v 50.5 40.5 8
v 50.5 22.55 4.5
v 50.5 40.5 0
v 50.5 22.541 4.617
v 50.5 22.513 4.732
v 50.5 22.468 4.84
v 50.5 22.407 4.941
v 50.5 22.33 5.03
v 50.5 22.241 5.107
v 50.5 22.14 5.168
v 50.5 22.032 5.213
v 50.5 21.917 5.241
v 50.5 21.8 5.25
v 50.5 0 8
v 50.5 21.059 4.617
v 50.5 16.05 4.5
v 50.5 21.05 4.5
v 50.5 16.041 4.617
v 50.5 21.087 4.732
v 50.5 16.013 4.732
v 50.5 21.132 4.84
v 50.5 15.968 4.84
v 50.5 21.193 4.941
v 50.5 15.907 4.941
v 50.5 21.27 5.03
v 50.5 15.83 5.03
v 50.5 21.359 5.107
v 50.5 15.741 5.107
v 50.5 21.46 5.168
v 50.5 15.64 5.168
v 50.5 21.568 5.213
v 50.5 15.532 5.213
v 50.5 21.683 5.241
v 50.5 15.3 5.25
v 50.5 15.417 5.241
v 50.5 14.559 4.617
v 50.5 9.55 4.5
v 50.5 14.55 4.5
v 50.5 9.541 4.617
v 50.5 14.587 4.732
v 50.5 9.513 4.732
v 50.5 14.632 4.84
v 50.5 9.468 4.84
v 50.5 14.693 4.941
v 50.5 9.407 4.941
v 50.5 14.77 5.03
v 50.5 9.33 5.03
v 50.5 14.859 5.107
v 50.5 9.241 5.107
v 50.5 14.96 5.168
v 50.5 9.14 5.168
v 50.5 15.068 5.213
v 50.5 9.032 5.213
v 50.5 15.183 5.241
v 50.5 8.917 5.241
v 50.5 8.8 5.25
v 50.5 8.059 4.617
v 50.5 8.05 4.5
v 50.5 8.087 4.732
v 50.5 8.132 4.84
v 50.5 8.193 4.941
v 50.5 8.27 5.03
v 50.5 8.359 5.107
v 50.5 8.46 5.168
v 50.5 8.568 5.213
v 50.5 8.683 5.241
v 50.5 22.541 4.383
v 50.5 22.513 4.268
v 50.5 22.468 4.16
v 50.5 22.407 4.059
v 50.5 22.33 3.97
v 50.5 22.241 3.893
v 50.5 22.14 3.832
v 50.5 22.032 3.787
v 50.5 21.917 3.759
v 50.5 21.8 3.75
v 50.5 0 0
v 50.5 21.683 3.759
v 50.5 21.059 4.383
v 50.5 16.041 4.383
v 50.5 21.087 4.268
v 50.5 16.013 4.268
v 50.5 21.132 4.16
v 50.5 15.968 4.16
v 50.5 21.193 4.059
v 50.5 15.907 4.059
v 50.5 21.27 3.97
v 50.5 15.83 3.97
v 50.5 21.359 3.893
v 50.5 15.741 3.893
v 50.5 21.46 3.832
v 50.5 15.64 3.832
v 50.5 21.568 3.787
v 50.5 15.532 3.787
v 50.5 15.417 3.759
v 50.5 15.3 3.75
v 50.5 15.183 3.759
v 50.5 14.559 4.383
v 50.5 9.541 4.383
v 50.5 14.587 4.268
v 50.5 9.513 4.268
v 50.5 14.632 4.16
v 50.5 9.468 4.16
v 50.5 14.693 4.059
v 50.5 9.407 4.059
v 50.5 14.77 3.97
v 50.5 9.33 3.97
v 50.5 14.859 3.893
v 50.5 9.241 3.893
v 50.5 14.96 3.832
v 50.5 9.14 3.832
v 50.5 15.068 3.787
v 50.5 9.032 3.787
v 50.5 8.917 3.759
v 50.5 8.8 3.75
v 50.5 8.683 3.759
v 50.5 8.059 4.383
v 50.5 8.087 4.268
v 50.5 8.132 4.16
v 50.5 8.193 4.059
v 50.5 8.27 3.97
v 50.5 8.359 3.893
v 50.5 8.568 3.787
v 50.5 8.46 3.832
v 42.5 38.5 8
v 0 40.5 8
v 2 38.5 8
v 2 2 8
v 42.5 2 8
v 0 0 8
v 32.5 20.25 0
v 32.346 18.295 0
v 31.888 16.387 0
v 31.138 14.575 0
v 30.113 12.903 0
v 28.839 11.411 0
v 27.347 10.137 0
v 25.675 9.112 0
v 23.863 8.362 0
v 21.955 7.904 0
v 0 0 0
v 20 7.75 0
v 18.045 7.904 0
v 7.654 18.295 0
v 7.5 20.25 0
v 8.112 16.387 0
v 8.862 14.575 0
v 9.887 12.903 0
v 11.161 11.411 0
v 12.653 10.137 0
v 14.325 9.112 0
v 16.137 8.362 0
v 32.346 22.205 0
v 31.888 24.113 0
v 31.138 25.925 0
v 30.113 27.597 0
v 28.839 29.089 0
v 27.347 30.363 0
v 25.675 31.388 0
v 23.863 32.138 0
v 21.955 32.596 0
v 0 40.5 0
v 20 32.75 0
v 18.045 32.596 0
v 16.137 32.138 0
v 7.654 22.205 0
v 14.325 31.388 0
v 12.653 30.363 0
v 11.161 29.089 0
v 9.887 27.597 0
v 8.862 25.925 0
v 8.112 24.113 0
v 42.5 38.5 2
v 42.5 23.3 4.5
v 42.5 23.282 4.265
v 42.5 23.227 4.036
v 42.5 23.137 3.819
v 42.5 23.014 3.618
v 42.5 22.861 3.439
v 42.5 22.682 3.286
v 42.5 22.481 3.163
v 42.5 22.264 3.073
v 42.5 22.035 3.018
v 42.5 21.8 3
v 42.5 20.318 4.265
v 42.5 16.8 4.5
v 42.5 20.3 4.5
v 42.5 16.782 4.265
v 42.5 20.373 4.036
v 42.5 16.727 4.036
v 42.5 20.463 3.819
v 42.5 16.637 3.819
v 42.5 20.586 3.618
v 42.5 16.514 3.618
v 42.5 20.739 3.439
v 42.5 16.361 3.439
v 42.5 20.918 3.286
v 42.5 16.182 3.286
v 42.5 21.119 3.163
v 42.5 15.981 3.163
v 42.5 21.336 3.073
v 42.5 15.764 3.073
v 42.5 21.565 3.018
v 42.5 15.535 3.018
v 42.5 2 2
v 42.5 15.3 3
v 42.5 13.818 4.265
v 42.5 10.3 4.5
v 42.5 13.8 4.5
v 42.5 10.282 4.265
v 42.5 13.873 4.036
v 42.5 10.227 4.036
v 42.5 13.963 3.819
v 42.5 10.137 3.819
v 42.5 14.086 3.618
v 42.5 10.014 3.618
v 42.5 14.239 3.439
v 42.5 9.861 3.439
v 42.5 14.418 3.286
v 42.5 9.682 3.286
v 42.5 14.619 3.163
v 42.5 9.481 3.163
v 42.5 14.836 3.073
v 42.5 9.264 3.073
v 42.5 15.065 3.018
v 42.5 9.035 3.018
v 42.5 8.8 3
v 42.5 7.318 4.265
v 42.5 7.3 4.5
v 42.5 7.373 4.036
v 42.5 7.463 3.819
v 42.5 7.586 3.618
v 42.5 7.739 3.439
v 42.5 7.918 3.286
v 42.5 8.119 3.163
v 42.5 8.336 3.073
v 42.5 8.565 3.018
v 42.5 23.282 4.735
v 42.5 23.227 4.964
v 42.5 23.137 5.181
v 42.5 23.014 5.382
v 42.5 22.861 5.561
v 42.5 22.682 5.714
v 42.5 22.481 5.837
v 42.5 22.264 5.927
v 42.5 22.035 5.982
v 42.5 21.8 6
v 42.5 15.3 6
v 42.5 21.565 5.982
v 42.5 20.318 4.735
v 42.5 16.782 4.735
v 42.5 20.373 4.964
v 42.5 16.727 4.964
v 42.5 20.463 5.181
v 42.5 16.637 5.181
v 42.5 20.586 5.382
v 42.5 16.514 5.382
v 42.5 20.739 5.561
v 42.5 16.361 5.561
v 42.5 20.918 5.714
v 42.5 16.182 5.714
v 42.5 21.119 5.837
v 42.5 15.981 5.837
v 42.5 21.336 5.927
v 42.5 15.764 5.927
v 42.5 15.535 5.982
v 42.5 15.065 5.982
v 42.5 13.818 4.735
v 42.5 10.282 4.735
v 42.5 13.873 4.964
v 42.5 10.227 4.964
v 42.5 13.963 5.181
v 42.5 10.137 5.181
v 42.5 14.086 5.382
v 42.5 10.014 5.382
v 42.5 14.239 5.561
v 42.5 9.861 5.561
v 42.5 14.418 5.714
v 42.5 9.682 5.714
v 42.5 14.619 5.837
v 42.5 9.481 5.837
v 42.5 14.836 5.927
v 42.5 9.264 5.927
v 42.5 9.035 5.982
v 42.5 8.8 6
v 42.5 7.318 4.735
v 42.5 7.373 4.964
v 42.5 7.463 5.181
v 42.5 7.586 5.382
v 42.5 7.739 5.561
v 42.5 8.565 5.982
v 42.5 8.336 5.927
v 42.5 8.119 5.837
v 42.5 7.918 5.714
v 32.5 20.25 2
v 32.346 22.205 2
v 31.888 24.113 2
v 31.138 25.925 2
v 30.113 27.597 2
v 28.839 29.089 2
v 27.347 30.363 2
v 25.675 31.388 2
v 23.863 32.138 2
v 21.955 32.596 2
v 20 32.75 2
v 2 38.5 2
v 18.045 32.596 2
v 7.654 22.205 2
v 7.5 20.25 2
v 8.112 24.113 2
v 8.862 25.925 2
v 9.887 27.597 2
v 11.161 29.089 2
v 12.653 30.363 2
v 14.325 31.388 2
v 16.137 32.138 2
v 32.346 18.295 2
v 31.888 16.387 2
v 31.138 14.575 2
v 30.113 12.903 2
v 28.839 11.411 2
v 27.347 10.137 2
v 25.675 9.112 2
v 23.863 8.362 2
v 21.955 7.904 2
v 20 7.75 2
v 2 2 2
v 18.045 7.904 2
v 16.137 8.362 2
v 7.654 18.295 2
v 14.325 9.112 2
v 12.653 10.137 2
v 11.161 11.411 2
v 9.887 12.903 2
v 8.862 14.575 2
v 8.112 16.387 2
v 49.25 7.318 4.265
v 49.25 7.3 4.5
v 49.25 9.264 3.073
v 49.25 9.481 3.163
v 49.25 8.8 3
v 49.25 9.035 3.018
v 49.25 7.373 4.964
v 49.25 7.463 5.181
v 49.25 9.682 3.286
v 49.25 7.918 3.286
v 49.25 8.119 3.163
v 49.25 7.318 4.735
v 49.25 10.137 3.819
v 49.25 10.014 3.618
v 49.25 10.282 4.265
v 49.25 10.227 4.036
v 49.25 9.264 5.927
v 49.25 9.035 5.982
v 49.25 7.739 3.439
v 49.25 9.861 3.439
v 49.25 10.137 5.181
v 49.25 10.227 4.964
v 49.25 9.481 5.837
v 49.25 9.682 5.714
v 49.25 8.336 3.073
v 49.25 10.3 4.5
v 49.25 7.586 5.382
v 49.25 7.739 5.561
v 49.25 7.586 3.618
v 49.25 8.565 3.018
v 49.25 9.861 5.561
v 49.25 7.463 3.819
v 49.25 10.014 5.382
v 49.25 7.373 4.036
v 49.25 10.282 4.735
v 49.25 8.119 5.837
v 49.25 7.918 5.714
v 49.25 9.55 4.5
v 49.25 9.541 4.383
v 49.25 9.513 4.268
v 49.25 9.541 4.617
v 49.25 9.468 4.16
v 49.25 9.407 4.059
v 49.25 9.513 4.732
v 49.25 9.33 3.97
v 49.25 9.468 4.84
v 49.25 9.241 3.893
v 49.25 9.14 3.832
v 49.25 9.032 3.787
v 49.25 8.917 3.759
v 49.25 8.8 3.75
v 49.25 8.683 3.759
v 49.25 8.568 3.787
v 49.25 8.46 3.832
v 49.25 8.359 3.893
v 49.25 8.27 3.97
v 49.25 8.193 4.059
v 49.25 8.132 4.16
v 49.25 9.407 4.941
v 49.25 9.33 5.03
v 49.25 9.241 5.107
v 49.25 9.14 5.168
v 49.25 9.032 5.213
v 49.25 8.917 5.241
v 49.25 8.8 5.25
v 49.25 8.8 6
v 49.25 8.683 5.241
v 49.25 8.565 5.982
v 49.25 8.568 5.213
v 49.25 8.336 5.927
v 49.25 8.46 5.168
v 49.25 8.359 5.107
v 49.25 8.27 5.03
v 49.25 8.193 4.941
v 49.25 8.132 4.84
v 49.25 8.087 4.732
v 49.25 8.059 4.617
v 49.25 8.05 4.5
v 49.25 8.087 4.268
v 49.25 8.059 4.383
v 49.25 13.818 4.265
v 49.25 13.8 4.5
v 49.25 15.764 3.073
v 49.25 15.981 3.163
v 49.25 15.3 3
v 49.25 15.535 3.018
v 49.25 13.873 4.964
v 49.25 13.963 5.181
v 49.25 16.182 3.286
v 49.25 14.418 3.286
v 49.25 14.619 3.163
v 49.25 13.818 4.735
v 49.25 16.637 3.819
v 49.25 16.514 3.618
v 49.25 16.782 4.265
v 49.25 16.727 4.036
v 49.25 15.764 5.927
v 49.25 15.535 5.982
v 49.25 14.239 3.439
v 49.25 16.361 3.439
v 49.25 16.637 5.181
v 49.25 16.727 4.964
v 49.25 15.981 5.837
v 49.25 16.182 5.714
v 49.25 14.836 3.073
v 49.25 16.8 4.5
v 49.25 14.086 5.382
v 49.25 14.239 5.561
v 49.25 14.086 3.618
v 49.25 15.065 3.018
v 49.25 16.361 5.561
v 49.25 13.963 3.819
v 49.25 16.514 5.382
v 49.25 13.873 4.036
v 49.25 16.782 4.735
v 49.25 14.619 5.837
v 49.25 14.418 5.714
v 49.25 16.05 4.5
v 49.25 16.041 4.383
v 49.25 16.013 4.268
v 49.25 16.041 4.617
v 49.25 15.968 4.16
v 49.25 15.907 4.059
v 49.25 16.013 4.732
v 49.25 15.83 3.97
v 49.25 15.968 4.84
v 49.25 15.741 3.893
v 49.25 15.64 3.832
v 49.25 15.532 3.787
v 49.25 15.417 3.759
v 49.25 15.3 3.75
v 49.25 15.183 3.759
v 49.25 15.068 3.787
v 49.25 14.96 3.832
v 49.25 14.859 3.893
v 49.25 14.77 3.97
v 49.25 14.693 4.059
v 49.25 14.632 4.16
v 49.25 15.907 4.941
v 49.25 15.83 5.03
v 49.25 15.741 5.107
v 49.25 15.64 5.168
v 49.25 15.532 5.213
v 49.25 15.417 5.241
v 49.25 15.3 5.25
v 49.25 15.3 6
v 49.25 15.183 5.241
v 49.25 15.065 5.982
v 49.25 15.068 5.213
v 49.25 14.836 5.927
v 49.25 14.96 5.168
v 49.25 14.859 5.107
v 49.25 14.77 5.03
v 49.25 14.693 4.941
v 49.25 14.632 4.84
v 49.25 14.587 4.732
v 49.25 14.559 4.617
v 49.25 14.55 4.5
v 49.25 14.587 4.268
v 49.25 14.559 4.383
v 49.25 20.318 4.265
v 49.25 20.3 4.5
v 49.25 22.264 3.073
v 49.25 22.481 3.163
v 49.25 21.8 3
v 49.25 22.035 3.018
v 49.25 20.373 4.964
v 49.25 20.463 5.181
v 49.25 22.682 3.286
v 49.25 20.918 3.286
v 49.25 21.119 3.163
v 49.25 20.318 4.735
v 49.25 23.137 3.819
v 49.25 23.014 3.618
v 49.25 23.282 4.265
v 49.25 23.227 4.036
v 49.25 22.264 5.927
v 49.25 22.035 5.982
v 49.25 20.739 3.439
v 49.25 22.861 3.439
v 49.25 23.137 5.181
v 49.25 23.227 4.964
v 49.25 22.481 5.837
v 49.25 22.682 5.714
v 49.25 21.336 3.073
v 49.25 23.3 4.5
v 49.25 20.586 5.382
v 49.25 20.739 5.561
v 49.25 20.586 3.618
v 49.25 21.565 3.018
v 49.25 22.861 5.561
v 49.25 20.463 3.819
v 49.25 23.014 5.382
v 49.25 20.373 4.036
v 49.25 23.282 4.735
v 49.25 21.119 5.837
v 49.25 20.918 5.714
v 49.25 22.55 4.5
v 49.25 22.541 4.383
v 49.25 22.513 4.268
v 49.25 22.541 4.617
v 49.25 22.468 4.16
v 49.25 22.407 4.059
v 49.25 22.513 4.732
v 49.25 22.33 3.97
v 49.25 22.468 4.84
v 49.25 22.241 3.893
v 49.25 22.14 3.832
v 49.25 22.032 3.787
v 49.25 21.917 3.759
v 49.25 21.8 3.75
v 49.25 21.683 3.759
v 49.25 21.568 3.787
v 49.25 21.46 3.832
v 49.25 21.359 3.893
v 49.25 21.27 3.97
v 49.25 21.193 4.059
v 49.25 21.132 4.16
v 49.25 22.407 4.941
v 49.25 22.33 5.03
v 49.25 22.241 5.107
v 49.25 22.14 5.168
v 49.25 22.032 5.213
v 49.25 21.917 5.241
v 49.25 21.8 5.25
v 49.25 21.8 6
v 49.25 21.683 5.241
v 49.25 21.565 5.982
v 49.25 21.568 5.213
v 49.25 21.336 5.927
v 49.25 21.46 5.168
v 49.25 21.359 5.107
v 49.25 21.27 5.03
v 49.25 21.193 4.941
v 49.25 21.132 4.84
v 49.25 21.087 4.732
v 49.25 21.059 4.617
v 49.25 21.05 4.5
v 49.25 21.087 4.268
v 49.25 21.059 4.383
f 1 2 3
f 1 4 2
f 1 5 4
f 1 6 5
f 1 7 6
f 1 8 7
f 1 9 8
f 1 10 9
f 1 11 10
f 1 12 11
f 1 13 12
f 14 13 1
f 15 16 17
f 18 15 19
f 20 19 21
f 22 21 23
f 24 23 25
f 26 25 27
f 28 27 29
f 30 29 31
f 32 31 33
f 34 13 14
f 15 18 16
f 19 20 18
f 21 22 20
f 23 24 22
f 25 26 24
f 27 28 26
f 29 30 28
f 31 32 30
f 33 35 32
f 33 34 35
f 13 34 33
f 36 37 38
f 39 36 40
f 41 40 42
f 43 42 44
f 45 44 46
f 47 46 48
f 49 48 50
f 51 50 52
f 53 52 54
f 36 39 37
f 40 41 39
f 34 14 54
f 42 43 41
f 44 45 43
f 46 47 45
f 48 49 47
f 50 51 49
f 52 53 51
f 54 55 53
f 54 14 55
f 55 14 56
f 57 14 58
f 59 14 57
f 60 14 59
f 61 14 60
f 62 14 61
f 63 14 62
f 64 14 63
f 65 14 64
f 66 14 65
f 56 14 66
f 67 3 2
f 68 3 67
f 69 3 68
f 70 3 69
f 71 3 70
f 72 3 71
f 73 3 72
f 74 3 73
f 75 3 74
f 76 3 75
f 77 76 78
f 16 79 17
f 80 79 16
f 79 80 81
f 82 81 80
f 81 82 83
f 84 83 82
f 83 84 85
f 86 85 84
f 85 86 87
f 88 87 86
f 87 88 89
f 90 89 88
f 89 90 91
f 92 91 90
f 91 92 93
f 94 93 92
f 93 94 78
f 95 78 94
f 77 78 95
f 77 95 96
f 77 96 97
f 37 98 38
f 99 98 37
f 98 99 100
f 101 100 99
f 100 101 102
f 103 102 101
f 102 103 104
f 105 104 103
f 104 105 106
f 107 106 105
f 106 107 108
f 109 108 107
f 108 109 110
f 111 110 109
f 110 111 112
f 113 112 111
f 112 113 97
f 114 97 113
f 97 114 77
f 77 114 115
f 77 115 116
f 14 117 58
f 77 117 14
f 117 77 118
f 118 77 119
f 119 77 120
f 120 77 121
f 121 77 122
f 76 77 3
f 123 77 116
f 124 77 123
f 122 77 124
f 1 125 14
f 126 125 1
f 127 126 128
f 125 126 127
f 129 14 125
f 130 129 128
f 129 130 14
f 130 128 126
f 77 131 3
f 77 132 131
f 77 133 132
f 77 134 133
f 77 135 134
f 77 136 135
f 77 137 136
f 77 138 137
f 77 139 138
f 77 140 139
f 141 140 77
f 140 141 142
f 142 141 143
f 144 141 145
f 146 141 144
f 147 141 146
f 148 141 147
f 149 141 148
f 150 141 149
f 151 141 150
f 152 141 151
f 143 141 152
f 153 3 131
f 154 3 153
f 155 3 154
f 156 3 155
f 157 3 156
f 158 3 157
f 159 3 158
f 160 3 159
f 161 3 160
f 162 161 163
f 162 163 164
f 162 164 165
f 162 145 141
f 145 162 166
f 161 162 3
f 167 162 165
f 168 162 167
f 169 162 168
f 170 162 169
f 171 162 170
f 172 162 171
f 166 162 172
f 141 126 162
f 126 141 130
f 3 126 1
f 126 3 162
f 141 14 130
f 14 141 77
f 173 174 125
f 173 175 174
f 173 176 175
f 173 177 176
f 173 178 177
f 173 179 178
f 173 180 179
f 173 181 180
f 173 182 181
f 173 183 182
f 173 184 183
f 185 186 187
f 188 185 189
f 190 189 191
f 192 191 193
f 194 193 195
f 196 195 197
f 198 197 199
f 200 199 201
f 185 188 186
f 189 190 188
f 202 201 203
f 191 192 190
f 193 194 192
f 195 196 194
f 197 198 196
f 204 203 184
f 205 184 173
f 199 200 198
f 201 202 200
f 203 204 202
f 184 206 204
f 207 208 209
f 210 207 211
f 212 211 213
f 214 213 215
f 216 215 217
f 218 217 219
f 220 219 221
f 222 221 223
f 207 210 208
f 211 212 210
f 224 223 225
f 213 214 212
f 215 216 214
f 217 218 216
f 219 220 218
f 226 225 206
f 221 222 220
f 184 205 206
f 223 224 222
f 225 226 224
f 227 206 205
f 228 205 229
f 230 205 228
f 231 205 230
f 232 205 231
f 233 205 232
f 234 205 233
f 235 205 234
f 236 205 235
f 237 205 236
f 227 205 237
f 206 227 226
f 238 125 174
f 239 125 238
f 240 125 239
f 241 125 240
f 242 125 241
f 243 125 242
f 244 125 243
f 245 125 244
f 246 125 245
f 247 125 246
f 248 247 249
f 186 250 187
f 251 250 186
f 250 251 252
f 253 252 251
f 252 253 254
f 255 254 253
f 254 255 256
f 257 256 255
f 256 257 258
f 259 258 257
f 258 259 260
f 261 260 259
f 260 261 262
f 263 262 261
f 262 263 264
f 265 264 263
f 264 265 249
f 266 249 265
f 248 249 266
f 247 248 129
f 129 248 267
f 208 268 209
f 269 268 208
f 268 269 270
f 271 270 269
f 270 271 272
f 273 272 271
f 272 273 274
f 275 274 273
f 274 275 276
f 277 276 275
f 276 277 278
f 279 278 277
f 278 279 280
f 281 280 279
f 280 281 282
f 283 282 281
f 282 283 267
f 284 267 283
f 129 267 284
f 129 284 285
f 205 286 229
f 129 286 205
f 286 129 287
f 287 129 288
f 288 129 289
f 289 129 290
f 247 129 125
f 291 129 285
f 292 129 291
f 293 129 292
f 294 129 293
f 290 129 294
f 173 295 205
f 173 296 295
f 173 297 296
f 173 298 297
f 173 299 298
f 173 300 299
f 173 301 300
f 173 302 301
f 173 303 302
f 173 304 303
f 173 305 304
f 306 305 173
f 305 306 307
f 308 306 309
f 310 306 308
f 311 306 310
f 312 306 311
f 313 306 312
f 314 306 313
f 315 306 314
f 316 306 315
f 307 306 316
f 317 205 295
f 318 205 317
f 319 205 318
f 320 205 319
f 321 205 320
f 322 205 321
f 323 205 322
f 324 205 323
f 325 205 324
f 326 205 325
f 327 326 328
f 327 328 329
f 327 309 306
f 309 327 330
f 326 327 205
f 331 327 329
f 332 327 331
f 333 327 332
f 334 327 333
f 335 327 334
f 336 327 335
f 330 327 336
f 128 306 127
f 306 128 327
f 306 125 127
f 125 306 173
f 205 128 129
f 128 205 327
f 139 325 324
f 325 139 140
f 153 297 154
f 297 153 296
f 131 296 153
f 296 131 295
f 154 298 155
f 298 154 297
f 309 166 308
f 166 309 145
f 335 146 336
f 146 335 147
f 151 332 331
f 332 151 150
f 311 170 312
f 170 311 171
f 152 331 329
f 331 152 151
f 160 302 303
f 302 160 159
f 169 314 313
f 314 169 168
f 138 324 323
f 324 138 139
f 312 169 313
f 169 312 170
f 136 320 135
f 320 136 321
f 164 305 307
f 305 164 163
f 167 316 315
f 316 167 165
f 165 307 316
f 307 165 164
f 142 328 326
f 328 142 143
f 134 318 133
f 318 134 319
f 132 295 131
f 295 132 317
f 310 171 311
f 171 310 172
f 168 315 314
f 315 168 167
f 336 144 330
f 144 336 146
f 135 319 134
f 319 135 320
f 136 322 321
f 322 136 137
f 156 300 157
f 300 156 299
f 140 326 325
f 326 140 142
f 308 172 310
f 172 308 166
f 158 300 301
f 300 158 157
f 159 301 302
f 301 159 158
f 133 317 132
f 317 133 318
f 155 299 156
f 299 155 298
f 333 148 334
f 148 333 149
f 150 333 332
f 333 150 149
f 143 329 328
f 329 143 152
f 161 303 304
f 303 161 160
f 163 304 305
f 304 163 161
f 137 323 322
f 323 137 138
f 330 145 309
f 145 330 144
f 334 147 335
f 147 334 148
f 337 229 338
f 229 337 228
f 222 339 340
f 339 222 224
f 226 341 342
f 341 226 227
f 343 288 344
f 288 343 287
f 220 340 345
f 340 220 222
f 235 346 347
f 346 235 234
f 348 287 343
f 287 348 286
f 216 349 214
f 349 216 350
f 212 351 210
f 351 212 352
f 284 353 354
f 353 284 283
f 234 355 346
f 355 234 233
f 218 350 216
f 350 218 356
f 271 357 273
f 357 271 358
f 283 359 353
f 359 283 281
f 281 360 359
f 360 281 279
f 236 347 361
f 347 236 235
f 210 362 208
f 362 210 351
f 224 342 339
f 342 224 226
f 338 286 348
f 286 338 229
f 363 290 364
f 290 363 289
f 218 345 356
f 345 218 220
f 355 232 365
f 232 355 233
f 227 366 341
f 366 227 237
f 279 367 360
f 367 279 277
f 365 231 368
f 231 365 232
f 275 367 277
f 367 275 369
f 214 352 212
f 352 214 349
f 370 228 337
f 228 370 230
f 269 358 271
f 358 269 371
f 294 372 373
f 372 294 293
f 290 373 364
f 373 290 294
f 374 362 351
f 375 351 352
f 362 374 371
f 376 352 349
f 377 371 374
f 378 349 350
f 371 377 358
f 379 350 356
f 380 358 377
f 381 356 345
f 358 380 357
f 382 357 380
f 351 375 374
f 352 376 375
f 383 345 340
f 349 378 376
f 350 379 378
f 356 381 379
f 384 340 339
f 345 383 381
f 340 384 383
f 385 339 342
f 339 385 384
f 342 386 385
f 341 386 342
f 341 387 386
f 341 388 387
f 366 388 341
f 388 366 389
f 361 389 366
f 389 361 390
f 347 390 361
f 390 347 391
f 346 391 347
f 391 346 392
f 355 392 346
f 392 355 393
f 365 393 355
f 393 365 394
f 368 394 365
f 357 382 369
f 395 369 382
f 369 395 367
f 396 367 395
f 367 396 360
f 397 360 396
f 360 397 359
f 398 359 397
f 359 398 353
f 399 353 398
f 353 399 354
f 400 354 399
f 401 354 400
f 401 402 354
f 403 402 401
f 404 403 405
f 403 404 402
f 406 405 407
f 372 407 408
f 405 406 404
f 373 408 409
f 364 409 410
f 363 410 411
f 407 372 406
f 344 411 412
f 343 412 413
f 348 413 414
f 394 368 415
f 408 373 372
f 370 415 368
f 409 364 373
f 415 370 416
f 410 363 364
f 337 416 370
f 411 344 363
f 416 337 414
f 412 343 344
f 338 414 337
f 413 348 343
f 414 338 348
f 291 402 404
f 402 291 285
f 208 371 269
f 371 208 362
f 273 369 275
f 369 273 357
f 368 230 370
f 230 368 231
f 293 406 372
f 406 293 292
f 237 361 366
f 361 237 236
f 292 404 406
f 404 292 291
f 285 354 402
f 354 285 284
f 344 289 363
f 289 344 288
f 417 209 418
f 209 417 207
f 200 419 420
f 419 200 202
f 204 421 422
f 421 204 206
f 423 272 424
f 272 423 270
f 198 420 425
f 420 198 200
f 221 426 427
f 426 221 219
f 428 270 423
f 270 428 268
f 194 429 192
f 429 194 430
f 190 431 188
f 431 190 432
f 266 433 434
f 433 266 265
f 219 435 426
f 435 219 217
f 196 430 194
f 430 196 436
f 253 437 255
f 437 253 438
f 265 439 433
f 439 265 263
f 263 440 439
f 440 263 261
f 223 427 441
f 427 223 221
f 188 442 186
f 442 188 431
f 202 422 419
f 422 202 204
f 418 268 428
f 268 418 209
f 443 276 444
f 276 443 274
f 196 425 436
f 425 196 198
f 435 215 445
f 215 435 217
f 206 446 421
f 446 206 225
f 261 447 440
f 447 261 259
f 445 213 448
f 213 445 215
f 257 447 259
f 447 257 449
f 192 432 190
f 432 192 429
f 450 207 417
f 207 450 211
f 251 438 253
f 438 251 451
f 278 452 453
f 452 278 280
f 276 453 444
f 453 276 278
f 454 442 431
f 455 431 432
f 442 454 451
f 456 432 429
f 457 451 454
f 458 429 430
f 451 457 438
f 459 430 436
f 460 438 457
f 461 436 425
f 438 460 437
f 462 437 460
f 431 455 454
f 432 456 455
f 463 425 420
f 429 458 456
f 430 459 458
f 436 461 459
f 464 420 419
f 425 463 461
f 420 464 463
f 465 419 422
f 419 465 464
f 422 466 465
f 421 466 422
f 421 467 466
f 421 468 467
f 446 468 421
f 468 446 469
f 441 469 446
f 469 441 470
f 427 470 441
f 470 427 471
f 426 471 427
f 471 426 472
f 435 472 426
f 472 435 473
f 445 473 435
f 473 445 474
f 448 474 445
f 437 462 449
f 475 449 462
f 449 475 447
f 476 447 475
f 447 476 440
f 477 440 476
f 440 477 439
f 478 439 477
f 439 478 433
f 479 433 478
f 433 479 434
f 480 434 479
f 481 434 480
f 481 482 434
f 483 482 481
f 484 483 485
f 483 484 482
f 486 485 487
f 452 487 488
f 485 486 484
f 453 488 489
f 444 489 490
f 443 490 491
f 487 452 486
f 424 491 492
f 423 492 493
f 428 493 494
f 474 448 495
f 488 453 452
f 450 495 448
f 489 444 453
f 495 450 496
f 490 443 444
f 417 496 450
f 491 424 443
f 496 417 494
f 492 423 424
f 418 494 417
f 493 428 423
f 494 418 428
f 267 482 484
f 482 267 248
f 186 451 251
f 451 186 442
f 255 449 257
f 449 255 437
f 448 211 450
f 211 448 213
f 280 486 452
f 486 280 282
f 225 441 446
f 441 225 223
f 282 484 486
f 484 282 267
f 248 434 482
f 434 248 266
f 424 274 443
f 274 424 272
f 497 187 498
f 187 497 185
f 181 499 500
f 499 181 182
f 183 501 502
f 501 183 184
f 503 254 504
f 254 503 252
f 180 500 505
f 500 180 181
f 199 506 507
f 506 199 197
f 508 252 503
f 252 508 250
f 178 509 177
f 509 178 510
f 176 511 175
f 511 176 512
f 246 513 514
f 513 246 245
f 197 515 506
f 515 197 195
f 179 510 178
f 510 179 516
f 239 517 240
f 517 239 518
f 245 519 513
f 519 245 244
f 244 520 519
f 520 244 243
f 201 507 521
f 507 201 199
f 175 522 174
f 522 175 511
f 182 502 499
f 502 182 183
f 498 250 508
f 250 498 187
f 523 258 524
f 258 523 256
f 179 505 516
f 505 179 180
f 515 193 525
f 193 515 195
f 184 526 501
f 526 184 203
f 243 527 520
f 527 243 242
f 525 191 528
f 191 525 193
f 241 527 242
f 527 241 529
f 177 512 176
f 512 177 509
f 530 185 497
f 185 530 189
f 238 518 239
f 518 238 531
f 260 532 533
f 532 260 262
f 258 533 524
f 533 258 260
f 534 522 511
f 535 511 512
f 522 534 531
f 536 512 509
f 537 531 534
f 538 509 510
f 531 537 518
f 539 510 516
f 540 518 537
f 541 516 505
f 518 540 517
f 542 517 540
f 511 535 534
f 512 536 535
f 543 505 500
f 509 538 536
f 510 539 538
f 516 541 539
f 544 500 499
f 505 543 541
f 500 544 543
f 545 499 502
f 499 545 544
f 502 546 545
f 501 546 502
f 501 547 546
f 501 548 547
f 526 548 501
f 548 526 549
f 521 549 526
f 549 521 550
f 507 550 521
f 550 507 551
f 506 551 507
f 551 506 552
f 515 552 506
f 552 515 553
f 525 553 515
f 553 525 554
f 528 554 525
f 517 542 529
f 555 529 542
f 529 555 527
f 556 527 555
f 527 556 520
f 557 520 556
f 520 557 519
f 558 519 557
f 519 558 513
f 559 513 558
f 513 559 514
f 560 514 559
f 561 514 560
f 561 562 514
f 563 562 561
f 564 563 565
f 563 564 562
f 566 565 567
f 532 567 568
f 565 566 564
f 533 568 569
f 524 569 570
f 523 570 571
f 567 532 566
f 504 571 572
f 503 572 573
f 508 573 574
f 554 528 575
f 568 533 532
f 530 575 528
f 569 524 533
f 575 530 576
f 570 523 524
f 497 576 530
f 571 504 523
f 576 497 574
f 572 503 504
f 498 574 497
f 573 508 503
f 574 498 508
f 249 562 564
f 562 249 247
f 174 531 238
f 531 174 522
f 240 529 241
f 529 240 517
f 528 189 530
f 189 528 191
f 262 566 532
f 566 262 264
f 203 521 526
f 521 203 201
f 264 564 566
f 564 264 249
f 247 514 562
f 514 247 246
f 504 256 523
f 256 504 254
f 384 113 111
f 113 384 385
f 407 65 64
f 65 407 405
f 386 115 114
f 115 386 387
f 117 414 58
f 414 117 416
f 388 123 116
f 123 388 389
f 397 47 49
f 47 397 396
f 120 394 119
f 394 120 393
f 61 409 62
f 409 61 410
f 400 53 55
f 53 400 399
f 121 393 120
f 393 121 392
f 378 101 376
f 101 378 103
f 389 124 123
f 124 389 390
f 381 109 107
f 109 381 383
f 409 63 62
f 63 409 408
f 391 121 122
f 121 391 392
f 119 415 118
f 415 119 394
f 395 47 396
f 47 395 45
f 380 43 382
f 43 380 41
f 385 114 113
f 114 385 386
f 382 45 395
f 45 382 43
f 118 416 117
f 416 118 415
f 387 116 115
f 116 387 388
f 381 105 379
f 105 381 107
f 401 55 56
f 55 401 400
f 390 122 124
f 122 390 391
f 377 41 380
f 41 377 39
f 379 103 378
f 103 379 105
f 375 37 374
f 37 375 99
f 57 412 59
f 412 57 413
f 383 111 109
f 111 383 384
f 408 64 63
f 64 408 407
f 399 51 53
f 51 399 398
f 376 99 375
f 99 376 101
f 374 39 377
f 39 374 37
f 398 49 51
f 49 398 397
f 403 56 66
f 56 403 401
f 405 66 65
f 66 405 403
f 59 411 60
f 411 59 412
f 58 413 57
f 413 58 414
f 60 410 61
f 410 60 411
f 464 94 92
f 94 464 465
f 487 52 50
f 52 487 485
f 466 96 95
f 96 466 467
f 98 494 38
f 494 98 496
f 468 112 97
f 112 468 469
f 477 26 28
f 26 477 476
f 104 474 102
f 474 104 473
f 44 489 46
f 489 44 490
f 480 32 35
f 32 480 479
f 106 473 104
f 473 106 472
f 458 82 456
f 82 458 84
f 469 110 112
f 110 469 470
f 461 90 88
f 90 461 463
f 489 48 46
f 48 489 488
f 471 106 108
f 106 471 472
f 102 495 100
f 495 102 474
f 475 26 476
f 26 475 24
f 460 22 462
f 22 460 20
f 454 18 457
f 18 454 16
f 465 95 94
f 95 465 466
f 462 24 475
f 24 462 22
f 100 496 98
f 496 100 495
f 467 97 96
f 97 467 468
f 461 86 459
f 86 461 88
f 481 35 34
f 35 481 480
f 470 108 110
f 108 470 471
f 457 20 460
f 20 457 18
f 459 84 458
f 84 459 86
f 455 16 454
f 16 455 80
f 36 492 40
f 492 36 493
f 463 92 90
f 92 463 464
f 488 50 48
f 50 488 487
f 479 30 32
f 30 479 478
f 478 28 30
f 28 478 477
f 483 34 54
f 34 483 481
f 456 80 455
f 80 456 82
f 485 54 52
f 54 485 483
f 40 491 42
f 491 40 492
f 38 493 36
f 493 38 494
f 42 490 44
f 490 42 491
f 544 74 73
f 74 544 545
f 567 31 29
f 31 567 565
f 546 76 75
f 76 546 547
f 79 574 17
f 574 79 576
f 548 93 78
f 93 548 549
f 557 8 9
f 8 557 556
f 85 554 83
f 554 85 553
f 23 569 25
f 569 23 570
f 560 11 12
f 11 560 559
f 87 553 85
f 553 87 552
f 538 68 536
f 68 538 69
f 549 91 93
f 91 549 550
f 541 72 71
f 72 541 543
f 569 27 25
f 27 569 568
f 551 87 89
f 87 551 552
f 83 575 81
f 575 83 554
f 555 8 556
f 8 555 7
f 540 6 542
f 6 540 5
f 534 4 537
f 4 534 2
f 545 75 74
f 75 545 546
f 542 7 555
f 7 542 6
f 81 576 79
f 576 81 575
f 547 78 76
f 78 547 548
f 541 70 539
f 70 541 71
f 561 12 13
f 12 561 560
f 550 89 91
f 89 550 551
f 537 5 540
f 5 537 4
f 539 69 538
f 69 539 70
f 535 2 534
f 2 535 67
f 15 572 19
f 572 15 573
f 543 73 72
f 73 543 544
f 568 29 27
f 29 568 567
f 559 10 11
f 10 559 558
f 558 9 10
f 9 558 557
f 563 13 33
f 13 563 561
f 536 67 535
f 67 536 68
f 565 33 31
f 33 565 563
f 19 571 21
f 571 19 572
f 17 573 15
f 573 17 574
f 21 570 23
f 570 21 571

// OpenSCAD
//****************************************************************
//*  Name    : Lithium Battery Plate                             *
//*  Author  : Robert Joseph Korn                                *
//*  Notice  : Copyright (c) 2015 Open Valley Consulting Corp    *
//*          : All Rights Reserved                               *
//*  Date    : 6/9/15                                            *
//*  Version : 1.0                                               *
//*  Notes   : For Minolta NP-1                                  *
//*          :                                                   *
//****************************************************************

$fn=40;

difference(){
	cube([50.5,40.5,8]);

	translate([2,2,2])      cube([40.5,36.5,6]);
	translate([20,20.25,0]) cylinder(d=25,h=8);

	translate([42.25,8.8,4.5])  rotate([0,90,0]) cylinder(d=3,h=7);
	translate([42.25,15.3,4.5]) rotate([0,90,0]) cylinder(d=3,h=7);
	translate([42.25,21.8,4.5]) rotate([0,90,0]) cylinder(d=3,h=7);

	translate([48,8.8,4.5])  rotate([0,90,0]) cylinder(d=1.5,h=4);
	translate([48,15.3,4.5]) rotate([0,90,0]) cylinder(d=1.5,h=4);
	translate([48,21.8,4.5]) rotate([0,90,0]) cylinder(d=1.5,h=4);

}
